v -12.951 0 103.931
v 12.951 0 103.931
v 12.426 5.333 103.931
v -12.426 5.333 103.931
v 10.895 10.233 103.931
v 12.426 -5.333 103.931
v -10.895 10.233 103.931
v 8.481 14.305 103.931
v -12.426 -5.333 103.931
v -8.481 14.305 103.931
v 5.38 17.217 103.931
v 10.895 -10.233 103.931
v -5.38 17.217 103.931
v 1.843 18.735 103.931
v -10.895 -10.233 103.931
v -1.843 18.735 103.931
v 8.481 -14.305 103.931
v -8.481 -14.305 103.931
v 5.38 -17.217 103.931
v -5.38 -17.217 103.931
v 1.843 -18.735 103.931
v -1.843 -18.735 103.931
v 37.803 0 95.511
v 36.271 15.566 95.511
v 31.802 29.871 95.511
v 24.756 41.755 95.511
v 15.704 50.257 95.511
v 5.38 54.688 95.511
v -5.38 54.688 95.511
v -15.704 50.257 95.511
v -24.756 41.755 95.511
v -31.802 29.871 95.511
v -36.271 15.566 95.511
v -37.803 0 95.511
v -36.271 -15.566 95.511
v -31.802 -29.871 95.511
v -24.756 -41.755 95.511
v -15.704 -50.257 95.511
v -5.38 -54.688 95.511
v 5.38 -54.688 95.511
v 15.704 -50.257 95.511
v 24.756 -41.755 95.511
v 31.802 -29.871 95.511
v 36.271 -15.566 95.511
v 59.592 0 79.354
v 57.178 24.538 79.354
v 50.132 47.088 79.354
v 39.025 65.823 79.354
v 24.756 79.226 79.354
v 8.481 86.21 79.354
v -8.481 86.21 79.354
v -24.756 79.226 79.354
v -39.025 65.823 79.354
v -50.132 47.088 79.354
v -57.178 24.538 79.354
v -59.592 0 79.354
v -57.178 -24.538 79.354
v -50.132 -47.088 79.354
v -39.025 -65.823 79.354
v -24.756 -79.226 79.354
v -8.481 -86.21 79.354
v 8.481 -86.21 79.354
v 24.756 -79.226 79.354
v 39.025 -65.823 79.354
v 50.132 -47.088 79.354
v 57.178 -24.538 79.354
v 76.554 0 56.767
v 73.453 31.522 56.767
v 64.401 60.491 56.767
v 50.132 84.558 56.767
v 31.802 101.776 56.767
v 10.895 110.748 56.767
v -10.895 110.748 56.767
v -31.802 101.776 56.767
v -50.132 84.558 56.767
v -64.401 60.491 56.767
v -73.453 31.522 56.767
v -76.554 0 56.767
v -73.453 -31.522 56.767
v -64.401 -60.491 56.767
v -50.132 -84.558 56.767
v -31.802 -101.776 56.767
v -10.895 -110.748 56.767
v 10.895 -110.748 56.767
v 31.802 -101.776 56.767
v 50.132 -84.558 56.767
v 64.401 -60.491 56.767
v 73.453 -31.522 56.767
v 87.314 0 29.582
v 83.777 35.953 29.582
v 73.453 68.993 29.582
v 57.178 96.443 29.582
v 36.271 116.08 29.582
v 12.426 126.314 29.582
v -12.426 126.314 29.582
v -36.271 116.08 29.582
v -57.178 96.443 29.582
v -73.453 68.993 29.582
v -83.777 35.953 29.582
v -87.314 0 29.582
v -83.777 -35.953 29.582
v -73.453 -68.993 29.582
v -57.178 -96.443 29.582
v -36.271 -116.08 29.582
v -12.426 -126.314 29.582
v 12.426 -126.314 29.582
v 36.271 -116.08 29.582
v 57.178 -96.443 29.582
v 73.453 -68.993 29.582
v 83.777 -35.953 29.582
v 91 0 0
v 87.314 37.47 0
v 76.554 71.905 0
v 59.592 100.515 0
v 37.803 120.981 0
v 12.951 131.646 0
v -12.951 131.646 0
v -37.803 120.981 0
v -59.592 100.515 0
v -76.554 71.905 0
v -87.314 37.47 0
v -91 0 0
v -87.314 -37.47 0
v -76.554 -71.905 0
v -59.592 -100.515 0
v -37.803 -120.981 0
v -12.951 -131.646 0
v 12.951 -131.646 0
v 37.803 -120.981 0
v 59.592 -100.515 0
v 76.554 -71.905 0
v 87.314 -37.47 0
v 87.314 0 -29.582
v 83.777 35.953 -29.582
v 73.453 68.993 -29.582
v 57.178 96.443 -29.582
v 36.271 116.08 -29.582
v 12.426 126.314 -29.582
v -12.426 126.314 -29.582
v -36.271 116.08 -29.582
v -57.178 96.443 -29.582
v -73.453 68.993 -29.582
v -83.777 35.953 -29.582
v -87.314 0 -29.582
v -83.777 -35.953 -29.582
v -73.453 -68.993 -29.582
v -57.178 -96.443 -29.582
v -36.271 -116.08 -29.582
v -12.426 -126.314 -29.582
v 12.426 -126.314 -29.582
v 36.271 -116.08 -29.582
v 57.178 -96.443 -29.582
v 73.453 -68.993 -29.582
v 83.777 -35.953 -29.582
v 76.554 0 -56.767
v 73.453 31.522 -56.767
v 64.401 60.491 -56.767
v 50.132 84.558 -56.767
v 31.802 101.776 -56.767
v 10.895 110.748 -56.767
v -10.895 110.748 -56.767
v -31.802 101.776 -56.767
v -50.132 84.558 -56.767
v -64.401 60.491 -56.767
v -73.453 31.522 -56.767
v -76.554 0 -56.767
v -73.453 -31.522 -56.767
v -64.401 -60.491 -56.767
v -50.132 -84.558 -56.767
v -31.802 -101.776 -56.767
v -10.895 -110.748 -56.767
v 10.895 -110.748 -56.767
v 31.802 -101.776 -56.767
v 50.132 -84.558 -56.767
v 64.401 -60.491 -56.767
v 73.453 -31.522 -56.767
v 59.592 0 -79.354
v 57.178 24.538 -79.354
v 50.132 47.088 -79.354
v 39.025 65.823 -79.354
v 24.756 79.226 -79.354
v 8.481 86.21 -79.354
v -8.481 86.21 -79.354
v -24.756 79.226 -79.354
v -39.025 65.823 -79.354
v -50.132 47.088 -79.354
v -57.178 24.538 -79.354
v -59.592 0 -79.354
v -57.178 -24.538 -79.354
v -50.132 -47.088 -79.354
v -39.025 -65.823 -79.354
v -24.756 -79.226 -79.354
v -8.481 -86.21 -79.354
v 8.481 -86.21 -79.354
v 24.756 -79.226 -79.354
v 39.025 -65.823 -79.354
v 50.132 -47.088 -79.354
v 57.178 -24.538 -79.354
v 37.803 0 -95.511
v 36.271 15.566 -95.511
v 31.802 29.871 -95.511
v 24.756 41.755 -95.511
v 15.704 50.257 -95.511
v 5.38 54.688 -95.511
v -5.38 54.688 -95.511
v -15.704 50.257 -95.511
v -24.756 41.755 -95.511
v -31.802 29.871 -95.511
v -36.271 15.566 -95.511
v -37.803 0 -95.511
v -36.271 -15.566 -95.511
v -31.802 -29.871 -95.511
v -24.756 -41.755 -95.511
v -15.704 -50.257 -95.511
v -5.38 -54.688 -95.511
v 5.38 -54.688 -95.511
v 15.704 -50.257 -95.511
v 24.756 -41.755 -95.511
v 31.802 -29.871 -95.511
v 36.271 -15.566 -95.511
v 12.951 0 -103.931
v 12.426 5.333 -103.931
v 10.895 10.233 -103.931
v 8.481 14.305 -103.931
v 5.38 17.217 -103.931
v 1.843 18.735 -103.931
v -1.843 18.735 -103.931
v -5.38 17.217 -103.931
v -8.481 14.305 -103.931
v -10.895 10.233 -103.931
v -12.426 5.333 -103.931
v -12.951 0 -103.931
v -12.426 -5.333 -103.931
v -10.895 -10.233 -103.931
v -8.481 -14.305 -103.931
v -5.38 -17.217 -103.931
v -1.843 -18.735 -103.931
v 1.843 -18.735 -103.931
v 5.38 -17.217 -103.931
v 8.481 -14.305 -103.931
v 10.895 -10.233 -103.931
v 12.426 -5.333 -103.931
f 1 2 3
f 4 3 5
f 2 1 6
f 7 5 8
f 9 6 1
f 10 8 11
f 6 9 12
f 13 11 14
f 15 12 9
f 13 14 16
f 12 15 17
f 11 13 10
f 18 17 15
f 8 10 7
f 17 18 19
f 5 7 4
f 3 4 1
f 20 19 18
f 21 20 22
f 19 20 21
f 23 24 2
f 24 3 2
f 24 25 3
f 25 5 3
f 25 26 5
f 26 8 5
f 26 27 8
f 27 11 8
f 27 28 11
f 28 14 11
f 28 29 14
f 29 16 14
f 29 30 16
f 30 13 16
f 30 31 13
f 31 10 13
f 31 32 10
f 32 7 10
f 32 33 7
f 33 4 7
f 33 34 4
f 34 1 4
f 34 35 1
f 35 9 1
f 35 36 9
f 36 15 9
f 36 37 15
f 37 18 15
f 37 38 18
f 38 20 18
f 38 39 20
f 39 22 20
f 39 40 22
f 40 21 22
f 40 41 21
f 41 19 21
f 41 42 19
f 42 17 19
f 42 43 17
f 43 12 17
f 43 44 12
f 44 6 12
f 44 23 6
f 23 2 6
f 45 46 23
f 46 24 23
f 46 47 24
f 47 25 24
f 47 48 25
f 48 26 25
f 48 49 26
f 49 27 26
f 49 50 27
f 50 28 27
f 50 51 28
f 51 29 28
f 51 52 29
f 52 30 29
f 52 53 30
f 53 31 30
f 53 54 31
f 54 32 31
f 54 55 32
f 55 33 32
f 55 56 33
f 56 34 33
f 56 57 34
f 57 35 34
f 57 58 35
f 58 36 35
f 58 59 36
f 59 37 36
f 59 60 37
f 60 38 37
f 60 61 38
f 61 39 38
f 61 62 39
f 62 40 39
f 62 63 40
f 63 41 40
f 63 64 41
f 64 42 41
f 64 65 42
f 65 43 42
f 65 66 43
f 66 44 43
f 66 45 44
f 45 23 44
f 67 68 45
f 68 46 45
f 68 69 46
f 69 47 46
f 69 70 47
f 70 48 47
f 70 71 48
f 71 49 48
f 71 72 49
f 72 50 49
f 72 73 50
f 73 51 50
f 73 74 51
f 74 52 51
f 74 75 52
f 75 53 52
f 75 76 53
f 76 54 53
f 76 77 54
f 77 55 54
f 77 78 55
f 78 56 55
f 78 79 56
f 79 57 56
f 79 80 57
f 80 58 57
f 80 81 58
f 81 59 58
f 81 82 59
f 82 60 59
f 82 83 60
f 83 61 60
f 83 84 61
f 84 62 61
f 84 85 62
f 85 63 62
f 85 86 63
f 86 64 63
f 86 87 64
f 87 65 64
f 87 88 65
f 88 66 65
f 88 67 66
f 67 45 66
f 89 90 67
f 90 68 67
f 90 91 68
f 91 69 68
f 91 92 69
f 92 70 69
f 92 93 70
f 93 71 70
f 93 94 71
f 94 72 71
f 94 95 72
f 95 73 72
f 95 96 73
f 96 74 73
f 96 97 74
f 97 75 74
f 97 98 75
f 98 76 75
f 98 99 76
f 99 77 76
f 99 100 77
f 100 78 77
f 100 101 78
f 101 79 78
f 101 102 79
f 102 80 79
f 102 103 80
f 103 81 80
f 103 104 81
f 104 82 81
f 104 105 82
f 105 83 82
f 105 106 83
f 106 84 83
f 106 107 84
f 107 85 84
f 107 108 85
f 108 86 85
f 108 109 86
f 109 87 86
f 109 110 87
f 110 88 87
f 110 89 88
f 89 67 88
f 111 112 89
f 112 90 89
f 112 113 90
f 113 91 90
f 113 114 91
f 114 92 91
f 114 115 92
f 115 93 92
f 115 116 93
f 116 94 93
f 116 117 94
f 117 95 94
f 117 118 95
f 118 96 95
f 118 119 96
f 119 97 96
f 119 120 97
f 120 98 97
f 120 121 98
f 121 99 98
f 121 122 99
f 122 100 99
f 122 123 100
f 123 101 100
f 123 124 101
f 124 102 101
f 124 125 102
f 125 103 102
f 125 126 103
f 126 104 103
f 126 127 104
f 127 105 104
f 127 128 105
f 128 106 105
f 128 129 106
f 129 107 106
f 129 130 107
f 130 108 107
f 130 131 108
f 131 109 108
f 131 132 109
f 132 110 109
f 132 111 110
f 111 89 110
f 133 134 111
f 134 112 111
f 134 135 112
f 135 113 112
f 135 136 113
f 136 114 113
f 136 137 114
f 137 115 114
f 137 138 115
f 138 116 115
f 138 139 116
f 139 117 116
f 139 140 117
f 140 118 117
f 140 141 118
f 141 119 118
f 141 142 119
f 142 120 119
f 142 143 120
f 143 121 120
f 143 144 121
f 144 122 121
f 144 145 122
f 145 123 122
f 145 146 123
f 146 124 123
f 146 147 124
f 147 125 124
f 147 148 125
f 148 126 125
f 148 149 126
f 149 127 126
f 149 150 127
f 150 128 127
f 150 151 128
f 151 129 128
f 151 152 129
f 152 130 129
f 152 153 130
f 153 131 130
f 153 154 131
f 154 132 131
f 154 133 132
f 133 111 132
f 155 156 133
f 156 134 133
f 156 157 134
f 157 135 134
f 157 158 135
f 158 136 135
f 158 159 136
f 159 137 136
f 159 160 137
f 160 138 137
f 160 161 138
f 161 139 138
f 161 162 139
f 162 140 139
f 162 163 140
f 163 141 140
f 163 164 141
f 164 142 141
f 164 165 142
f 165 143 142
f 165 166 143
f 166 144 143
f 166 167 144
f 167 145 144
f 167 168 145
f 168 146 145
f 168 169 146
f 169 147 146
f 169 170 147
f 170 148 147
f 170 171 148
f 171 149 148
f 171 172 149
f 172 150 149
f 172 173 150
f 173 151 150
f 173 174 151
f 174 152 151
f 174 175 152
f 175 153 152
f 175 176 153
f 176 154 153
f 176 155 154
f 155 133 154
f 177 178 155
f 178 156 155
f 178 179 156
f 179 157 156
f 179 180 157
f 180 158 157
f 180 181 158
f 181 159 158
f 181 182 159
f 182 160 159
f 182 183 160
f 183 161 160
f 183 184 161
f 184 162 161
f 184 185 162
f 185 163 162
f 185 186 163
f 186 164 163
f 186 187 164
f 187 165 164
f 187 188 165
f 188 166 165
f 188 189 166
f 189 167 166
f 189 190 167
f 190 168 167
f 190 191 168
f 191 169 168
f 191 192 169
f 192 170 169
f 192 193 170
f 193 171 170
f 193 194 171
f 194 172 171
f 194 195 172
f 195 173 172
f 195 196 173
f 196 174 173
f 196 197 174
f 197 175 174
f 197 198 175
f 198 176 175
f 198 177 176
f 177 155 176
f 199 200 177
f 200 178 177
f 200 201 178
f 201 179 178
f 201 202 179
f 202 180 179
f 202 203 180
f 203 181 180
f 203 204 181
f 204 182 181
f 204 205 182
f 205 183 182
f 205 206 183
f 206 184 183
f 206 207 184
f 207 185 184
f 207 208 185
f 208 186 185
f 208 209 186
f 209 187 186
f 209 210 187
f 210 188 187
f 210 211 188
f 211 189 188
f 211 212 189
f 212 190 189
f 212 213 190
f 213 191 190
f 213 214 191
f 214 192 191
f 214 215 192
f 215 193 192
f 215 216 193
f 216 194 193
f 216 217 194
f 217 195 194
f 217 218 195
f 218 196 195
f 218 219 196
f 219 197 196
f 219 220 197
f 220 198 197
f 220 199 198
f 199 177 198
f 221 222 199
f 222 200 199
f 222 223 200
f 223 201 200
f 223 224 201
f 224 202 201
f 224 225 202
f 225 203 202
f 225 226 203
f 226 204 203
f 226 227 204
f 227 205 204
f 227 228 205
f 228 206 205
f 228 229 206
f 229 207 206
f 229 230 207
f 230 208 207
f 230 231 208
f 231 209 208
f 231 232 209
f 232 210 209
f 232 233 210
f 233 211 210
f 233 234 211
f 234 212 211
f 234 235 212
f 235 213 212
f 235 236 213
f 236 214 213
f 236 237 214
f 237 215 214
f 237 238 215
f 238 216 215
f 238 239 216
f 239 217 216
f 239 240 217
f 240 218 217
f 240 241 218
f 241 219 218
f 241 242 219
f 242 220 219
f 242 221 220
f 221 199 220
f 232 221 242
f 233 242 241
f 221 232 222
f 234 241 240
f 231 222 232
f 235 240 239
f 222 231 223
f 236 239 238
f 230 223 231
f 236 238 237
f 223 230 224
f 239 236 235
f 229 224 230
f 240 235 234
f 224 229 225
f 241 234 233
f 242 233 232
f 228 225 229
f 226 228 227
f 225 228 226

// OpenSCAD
// Generated by SolidPython 1.0.1 on 2020-07-29 00:46:51


scale(v = [13, 19, 15]) {
	sphere(r = 7);
}
/***********************************************
*********      SolidPython code:      **********
************************************************
 
# import packages: SolidPython
from solid import *
from solid.utils import *
from itertools import chain, combinations, permutations


class Resize:

    def __init__(self, scad_file):
        self.scad_file = scad_file
        #self.scad_file = import_scad(scad_file)
        # cone/cylinder param:
        self.r1 = 0
        self.r2 = 0
        self.h = 0
        # rectangular prism param:
        self.w = 0
        self.l = 0
        # ellipse param:
        self.r = 0

    # import OpenScad code (file name corresponds to shape)


    # classify shape + parameters
    def assign(self, param1, param2, param3):
        if self.scad_file == 'cone.scad':
            self.r1 = param1
            self.r2 = param2
            self.h = param3
        elif self.scad_file == 'cylinder.scad':
            self.r1 = param1
            self.r2 = param2
            self.h = param3
        elif self.scad_file == 'rectangularPrism.scad':
            self.h = param1
            self.l = param2
            self.w = param3
        else:
            self.r = param1
            self.h = param2

    # resize parameters
    def iterate(self):
        x = range(3, 20, 2)
        i = 1
        if self.scad_file == 'cone.scad':
            tempList = list(permutations(x, 2))
            for temp in tempList:
                param1 = temp[0]
                param2 = temp[1]
                filepath = 'produced_scad_files/' + 'cone' + str(param1) + '_' + str(param2) + '_' + '.scad'
                scad_render_to_file(cylinder(h=param1, r1=param2, r2=0), filepath)

        elif self.scad_file == 'cylinder.scad':
            tempList = list(permutations(x, 3))
            for temp in tempList:
                param1 = temp[0]
                param2 = temp[1]
                filepath = 'produced_scad_files/' + 'cylinder' + str(param1) + '_' + str(param2) + '_' + '.scad'
                scad_render_to_file(cylinder(h=param1, r1=param2, r2=param2), filepath)

        elif self.scad_file == 'rectangularPrism.scad':
            tempList = list(permutations(x, 3))
            for temp in tempList:
                param1 = temp[0]
                param2 = temp[1]
                param3 = temp[2]
                filepath = 'produced_scad_files/' + 'rectangularPrism' + str(param1) + '_' + str(param2) + '_' + str(
                    param3) + '.scad'
                scad_render_to_file(cube(size=(param1, param2, param3)), filepath)

        elif self.scad_file == 'ellipse.scad':
            tempList = list(permutations(x, 4))
            for temp in tempList:
                param1 = temp[0]
                param2 = temp[1]
                param3 = temp[2]
                param4 = temp[3]
                filepath = 'produced_scad_files/' + 'ellipse' + str(param1) + '_' + str(param2) + '_' + str(param3) + '_' + str(param4) + '.scad'
                scad_render_to_file(scale([param1, param2, param3])(sphere(r=param4)), filepath)

    def render_to_scadfile(self):
        scad_render_to_file(scad, 'example.scad') 
 
************************************************/
